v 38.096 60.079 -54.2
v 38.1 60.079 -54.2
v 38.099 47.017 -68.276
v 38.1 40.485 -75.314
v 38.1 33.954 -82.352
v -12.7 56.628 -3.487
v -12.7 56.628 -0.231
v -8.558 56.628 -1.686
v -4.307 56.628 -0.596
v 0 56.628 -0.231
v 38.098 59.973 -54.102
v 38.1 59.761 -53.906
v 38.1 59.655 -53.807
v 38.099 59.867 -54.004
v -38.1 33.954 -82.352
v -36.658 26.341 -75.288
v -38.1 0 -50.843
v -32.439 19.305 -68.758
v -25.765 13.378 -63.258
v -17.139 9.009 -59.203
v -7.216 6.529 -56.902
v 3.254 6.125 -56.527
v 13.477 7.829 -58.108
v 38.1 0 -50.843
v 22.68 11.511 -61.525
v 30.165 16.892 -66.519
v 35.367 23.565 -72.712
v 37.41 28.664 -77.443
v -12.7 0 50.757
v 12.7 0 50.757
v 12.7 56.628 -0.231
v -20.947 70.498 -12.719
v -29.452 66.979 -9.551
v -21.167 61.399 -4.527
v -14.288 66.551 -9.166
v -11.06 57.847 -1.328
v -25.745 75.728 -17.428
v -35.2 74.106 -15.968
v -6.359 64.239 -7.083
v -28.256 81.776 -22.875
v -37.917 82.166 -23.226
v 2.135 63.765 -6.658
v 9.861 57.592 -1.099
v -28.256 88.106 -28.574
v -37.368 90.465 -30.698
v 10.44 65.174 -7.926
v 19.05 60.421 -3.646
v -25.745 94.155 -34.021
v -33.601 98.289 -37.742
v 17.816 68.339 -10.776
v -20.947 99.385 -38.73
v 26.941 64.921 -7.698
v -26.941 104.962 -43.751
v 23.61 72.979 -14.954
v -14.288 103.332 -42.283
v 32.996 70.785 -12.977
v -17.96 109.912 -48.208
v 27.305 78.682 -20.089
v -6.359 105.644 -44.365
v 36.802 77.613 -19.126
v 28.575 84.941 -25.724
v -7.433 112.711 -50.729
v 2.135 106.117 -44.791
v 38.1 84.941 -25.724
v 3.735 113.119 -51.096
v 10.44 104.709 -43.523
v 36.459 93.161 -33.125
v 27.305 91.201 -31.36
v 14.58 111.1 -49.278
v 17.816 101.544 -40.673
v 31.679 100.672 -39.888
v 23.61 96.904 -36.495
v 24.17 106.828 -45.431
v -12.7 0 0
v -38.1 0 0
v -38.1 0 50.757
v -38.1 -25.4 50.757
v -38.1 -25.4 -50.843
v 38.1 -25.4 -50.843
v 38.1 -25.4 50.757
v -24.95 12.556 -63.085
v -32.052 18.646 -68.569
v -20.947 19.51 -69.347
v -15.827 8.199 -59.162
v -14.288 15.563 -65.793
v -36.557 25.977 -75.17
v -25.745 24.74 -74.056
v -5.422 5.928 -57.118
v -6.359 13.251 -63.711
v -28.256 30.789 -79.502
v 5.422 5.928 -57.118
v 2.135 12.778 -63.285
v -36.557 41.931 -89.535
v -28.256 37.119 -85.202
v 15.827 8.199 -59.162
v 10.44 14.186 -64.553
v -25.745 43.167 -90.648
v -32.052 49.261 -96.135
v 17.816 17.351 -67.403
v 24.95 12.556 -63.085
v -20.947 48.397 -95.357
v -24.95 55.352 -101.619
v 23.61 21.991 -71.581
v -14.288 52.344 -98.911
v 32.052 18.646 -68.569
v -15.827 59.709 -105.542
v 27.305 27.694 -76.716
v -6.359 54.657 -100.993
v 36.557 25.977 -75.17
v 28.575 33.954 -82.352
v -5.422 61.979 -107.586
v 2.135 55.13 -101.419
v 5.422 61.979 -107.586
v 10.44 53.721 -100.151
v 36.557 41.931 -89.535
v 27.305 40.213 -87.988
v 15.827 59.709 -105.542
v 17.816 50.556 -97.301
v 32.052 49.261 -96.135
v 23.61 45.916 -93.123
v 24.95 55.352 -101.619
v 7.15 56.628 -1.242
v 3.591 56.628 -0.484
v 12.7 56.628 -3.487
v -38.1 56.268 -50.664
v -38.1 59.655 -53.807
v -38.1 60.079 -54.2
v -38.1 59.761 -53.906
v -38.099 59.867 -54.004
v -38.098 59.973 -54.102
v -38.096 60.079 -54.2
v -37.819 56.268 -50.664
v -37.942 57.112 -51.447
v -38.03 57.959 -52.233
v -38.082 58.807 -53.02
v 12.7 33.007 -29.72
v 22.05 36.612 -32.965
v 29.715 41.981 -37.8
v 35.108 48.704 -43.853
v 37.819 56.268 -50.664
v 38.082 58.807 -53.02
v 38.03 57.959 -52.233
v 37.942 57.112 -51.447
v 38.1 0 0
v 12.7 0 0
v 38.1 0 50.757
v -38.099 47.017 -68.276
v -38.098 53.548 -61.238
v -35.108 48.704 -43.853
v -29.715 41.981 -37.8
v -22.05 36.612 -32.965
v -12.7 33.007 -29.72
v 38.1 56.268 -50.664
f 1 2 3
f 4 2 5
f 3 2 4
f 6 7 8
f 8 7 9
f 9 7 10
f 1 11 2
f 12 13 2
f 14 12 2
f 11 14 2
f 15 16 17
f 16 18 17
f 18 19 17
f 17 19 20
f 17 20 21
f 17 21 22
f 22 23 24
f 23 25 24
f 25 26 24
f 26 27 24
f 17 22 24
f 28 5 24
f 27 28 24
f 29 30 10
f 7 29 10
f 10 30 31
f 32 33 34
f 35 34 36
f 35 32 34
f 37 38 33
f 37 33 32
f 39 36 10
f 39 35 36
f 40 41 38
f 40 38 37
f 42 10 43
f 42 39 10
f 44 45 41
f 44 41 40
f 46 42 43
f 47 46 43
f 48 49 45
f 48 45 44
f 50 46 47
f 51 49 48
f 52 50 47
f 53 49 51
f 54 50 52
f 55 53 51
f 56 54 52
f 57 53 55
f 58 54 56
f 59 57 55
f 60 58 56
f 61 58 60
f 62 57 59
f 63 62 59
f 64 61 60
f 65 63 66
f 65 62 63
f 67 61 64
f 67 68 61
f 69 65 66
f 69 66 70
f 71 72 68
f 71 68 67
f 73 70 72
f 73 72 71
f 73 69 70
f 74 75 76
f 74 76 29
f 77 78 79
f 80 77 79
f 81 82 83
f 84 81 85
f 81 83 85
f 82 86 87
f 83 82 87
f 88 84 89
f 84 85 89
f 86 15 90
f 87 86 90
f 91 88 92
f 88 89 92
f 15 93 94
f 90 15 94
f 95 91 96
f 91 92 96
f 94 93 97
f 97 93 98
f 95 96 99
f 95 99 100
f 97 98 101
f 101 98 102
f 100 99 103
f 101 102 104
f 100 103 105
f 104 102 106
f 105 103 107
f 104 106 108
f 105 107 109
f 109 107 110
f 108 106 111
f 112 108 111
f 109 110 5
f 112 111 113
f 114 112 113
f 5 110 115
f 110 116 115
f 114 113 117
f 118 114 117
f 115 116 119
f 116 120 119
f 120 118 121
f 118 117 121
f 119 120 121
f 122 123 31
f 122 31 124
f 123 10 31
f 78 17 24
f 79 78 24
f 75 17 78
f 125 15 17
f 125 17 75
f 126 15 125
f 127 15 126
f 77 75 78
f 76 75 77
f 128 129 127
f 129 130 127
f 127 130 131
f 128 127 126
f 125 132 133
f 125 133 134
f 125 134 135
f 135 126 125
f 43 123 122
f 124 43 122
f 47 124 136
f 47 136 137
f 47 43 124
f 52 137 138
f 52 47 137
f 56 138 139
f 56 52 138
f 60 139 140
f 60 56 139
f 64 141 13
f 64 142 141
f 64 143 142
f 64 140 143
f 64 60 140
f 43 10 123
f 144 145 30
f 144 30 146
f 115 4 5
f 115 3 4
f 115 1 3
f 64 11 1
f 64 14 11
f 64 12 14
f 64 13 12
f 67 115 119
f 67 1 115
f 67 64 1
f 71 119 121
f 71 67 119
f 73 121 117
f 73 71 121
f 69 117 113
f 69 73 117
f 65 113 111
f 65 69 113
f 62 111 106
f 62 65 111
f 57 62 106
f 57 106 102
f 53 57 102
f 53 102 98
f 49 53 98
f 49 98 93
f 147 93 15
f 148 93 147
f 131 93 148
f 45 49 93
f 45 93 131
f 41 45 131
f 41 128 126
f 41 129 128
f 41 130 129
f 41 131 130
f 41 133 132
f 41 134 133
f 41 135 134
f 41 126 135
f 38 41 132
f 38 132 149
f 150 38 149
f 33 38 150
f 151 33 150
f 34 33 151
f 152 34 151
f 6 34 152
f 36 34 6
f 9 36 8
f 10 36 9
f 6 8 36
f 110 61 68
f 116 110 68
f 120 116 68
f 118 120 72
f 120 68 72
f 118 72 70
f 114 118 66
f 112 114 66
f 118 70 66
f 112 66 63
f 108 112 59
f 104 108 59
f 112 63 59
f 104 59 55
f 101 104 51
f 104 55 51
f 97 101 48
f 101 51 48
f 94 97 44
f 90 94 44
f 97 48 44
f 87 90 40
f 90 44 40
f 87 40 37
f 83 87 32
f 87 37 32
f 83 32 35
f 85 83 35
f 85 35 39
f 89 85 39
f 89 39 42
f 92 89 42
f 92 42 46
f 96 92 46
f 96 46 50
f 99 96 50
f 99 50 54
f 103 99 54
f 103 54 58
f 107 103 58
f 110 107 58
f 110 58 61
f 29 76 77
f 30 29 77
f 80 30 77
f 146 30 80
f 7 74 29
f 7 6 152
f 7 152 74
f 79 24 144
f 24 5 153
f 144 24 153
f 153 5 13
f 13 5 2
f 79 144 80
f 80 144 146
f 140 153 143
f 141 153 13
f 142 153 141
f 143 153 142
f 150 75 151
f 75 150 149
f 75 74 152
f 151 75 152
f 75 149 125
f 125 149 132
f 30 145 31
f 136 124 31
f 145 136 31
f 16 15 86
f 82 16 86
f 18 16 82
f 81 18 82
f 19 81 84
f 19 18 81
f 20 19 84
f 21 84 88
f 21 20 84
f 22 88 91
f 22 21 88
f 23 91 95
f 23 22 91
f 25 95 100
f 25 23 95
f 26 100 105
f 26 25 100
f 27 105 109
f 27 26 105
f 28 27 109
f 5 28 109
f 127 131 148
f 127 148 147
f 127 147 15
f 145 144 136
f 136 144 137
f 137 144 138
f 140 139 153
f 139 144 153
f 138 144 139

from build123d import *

# Parameters (mm, degrees)
SKETCH5_W           = 76.2
SKETCH5_H           = 101.6
BOSS_EXTRUDE2_DEPTH = 25.4
BOSS_EXTRUDE3_DEPTH = 12.7
SKETCH8_R           = 38.1
BOSS_EXTRUDE4_DEPTH = 76.2
BOSS_EXTRUDE7_DEPTH = 76.2
SKETCH11_R          = 28.575
CUT_EXTRUDE3_DEPTH  = 135.861020279


with BuildPart() as part:
    # Sketch5 → Boss-Extrude2 (new body)
    with BuildSketch(Plane(origin=(0, 0, 0), x_dir=(1, 0, 0), z_dir=(0, 1, 0))):
        with Locations((0, 0.042847785)):
            Rectangle(SKETCH5_W, SKETCH5_H)
    extrude(amount=-BOSS_EXTRUDE2_DEPTH)

    # Sketch7 → Boss-Extrude3 (add, symmetric)
    with BuildSketch(Plane(origin=(0, 0, 0), x_dir=(0, 0, -1), z_dir=(1, 0, 0))):
        Polygon((-50.757152215, 0), (0.23059999, 56.627635701), (50.987752205, 56.627635701), (0, 0), align=None)
    extrude(amount=BOSS_EXTRUDE3_DEPTH, both=True)

    # Sketch8 → Boss-Extrude4 (add)
    with BuildSketch(Plane(origin=(0, 25.239549612, 28.031359668), x_dir=(1, 0, 0), z_dir=(0, 0.669130606, 0.743144825))):
        with Locations((0, 80.336835961)):
            Circle(SKETCH8_R)
    extrude(amount=-BOSS_EXTRUDE4_DEPTH)

    # Sketch14 → Boss-Extrude7 (add, through all)
    with BuildSketch(Plane(origin=(38.1, 0, 0), x_dir=(0, 0, -1), z_dir=(1, 0, 0))):
        Polygon((82.352111793, 33.953701348), (50.842847785, 0), (0, 0), (50.664048261, 56.26812605), (54.200329047, 60.078745736), align=None)
    extrude(amount=-BOSS_EXTRUDE7_DEPTH)

    # Sketch11 → Cut-Extrude3 (cut, through all)
    with BuildSketch(Plane(origin=(0, 25.239549612, 28.031359668), x_dir=(1, 0, 0), z_dir=(0, 0.669130606, 0.743144825))):
        with Locations((0, 80.336835961)):
            Circle(SKETCH11_R)
    extrude(amount=-CUT_EXTRUDE3_DEPTH, mode=Mode.SUBTRACT)


solid = part.part
